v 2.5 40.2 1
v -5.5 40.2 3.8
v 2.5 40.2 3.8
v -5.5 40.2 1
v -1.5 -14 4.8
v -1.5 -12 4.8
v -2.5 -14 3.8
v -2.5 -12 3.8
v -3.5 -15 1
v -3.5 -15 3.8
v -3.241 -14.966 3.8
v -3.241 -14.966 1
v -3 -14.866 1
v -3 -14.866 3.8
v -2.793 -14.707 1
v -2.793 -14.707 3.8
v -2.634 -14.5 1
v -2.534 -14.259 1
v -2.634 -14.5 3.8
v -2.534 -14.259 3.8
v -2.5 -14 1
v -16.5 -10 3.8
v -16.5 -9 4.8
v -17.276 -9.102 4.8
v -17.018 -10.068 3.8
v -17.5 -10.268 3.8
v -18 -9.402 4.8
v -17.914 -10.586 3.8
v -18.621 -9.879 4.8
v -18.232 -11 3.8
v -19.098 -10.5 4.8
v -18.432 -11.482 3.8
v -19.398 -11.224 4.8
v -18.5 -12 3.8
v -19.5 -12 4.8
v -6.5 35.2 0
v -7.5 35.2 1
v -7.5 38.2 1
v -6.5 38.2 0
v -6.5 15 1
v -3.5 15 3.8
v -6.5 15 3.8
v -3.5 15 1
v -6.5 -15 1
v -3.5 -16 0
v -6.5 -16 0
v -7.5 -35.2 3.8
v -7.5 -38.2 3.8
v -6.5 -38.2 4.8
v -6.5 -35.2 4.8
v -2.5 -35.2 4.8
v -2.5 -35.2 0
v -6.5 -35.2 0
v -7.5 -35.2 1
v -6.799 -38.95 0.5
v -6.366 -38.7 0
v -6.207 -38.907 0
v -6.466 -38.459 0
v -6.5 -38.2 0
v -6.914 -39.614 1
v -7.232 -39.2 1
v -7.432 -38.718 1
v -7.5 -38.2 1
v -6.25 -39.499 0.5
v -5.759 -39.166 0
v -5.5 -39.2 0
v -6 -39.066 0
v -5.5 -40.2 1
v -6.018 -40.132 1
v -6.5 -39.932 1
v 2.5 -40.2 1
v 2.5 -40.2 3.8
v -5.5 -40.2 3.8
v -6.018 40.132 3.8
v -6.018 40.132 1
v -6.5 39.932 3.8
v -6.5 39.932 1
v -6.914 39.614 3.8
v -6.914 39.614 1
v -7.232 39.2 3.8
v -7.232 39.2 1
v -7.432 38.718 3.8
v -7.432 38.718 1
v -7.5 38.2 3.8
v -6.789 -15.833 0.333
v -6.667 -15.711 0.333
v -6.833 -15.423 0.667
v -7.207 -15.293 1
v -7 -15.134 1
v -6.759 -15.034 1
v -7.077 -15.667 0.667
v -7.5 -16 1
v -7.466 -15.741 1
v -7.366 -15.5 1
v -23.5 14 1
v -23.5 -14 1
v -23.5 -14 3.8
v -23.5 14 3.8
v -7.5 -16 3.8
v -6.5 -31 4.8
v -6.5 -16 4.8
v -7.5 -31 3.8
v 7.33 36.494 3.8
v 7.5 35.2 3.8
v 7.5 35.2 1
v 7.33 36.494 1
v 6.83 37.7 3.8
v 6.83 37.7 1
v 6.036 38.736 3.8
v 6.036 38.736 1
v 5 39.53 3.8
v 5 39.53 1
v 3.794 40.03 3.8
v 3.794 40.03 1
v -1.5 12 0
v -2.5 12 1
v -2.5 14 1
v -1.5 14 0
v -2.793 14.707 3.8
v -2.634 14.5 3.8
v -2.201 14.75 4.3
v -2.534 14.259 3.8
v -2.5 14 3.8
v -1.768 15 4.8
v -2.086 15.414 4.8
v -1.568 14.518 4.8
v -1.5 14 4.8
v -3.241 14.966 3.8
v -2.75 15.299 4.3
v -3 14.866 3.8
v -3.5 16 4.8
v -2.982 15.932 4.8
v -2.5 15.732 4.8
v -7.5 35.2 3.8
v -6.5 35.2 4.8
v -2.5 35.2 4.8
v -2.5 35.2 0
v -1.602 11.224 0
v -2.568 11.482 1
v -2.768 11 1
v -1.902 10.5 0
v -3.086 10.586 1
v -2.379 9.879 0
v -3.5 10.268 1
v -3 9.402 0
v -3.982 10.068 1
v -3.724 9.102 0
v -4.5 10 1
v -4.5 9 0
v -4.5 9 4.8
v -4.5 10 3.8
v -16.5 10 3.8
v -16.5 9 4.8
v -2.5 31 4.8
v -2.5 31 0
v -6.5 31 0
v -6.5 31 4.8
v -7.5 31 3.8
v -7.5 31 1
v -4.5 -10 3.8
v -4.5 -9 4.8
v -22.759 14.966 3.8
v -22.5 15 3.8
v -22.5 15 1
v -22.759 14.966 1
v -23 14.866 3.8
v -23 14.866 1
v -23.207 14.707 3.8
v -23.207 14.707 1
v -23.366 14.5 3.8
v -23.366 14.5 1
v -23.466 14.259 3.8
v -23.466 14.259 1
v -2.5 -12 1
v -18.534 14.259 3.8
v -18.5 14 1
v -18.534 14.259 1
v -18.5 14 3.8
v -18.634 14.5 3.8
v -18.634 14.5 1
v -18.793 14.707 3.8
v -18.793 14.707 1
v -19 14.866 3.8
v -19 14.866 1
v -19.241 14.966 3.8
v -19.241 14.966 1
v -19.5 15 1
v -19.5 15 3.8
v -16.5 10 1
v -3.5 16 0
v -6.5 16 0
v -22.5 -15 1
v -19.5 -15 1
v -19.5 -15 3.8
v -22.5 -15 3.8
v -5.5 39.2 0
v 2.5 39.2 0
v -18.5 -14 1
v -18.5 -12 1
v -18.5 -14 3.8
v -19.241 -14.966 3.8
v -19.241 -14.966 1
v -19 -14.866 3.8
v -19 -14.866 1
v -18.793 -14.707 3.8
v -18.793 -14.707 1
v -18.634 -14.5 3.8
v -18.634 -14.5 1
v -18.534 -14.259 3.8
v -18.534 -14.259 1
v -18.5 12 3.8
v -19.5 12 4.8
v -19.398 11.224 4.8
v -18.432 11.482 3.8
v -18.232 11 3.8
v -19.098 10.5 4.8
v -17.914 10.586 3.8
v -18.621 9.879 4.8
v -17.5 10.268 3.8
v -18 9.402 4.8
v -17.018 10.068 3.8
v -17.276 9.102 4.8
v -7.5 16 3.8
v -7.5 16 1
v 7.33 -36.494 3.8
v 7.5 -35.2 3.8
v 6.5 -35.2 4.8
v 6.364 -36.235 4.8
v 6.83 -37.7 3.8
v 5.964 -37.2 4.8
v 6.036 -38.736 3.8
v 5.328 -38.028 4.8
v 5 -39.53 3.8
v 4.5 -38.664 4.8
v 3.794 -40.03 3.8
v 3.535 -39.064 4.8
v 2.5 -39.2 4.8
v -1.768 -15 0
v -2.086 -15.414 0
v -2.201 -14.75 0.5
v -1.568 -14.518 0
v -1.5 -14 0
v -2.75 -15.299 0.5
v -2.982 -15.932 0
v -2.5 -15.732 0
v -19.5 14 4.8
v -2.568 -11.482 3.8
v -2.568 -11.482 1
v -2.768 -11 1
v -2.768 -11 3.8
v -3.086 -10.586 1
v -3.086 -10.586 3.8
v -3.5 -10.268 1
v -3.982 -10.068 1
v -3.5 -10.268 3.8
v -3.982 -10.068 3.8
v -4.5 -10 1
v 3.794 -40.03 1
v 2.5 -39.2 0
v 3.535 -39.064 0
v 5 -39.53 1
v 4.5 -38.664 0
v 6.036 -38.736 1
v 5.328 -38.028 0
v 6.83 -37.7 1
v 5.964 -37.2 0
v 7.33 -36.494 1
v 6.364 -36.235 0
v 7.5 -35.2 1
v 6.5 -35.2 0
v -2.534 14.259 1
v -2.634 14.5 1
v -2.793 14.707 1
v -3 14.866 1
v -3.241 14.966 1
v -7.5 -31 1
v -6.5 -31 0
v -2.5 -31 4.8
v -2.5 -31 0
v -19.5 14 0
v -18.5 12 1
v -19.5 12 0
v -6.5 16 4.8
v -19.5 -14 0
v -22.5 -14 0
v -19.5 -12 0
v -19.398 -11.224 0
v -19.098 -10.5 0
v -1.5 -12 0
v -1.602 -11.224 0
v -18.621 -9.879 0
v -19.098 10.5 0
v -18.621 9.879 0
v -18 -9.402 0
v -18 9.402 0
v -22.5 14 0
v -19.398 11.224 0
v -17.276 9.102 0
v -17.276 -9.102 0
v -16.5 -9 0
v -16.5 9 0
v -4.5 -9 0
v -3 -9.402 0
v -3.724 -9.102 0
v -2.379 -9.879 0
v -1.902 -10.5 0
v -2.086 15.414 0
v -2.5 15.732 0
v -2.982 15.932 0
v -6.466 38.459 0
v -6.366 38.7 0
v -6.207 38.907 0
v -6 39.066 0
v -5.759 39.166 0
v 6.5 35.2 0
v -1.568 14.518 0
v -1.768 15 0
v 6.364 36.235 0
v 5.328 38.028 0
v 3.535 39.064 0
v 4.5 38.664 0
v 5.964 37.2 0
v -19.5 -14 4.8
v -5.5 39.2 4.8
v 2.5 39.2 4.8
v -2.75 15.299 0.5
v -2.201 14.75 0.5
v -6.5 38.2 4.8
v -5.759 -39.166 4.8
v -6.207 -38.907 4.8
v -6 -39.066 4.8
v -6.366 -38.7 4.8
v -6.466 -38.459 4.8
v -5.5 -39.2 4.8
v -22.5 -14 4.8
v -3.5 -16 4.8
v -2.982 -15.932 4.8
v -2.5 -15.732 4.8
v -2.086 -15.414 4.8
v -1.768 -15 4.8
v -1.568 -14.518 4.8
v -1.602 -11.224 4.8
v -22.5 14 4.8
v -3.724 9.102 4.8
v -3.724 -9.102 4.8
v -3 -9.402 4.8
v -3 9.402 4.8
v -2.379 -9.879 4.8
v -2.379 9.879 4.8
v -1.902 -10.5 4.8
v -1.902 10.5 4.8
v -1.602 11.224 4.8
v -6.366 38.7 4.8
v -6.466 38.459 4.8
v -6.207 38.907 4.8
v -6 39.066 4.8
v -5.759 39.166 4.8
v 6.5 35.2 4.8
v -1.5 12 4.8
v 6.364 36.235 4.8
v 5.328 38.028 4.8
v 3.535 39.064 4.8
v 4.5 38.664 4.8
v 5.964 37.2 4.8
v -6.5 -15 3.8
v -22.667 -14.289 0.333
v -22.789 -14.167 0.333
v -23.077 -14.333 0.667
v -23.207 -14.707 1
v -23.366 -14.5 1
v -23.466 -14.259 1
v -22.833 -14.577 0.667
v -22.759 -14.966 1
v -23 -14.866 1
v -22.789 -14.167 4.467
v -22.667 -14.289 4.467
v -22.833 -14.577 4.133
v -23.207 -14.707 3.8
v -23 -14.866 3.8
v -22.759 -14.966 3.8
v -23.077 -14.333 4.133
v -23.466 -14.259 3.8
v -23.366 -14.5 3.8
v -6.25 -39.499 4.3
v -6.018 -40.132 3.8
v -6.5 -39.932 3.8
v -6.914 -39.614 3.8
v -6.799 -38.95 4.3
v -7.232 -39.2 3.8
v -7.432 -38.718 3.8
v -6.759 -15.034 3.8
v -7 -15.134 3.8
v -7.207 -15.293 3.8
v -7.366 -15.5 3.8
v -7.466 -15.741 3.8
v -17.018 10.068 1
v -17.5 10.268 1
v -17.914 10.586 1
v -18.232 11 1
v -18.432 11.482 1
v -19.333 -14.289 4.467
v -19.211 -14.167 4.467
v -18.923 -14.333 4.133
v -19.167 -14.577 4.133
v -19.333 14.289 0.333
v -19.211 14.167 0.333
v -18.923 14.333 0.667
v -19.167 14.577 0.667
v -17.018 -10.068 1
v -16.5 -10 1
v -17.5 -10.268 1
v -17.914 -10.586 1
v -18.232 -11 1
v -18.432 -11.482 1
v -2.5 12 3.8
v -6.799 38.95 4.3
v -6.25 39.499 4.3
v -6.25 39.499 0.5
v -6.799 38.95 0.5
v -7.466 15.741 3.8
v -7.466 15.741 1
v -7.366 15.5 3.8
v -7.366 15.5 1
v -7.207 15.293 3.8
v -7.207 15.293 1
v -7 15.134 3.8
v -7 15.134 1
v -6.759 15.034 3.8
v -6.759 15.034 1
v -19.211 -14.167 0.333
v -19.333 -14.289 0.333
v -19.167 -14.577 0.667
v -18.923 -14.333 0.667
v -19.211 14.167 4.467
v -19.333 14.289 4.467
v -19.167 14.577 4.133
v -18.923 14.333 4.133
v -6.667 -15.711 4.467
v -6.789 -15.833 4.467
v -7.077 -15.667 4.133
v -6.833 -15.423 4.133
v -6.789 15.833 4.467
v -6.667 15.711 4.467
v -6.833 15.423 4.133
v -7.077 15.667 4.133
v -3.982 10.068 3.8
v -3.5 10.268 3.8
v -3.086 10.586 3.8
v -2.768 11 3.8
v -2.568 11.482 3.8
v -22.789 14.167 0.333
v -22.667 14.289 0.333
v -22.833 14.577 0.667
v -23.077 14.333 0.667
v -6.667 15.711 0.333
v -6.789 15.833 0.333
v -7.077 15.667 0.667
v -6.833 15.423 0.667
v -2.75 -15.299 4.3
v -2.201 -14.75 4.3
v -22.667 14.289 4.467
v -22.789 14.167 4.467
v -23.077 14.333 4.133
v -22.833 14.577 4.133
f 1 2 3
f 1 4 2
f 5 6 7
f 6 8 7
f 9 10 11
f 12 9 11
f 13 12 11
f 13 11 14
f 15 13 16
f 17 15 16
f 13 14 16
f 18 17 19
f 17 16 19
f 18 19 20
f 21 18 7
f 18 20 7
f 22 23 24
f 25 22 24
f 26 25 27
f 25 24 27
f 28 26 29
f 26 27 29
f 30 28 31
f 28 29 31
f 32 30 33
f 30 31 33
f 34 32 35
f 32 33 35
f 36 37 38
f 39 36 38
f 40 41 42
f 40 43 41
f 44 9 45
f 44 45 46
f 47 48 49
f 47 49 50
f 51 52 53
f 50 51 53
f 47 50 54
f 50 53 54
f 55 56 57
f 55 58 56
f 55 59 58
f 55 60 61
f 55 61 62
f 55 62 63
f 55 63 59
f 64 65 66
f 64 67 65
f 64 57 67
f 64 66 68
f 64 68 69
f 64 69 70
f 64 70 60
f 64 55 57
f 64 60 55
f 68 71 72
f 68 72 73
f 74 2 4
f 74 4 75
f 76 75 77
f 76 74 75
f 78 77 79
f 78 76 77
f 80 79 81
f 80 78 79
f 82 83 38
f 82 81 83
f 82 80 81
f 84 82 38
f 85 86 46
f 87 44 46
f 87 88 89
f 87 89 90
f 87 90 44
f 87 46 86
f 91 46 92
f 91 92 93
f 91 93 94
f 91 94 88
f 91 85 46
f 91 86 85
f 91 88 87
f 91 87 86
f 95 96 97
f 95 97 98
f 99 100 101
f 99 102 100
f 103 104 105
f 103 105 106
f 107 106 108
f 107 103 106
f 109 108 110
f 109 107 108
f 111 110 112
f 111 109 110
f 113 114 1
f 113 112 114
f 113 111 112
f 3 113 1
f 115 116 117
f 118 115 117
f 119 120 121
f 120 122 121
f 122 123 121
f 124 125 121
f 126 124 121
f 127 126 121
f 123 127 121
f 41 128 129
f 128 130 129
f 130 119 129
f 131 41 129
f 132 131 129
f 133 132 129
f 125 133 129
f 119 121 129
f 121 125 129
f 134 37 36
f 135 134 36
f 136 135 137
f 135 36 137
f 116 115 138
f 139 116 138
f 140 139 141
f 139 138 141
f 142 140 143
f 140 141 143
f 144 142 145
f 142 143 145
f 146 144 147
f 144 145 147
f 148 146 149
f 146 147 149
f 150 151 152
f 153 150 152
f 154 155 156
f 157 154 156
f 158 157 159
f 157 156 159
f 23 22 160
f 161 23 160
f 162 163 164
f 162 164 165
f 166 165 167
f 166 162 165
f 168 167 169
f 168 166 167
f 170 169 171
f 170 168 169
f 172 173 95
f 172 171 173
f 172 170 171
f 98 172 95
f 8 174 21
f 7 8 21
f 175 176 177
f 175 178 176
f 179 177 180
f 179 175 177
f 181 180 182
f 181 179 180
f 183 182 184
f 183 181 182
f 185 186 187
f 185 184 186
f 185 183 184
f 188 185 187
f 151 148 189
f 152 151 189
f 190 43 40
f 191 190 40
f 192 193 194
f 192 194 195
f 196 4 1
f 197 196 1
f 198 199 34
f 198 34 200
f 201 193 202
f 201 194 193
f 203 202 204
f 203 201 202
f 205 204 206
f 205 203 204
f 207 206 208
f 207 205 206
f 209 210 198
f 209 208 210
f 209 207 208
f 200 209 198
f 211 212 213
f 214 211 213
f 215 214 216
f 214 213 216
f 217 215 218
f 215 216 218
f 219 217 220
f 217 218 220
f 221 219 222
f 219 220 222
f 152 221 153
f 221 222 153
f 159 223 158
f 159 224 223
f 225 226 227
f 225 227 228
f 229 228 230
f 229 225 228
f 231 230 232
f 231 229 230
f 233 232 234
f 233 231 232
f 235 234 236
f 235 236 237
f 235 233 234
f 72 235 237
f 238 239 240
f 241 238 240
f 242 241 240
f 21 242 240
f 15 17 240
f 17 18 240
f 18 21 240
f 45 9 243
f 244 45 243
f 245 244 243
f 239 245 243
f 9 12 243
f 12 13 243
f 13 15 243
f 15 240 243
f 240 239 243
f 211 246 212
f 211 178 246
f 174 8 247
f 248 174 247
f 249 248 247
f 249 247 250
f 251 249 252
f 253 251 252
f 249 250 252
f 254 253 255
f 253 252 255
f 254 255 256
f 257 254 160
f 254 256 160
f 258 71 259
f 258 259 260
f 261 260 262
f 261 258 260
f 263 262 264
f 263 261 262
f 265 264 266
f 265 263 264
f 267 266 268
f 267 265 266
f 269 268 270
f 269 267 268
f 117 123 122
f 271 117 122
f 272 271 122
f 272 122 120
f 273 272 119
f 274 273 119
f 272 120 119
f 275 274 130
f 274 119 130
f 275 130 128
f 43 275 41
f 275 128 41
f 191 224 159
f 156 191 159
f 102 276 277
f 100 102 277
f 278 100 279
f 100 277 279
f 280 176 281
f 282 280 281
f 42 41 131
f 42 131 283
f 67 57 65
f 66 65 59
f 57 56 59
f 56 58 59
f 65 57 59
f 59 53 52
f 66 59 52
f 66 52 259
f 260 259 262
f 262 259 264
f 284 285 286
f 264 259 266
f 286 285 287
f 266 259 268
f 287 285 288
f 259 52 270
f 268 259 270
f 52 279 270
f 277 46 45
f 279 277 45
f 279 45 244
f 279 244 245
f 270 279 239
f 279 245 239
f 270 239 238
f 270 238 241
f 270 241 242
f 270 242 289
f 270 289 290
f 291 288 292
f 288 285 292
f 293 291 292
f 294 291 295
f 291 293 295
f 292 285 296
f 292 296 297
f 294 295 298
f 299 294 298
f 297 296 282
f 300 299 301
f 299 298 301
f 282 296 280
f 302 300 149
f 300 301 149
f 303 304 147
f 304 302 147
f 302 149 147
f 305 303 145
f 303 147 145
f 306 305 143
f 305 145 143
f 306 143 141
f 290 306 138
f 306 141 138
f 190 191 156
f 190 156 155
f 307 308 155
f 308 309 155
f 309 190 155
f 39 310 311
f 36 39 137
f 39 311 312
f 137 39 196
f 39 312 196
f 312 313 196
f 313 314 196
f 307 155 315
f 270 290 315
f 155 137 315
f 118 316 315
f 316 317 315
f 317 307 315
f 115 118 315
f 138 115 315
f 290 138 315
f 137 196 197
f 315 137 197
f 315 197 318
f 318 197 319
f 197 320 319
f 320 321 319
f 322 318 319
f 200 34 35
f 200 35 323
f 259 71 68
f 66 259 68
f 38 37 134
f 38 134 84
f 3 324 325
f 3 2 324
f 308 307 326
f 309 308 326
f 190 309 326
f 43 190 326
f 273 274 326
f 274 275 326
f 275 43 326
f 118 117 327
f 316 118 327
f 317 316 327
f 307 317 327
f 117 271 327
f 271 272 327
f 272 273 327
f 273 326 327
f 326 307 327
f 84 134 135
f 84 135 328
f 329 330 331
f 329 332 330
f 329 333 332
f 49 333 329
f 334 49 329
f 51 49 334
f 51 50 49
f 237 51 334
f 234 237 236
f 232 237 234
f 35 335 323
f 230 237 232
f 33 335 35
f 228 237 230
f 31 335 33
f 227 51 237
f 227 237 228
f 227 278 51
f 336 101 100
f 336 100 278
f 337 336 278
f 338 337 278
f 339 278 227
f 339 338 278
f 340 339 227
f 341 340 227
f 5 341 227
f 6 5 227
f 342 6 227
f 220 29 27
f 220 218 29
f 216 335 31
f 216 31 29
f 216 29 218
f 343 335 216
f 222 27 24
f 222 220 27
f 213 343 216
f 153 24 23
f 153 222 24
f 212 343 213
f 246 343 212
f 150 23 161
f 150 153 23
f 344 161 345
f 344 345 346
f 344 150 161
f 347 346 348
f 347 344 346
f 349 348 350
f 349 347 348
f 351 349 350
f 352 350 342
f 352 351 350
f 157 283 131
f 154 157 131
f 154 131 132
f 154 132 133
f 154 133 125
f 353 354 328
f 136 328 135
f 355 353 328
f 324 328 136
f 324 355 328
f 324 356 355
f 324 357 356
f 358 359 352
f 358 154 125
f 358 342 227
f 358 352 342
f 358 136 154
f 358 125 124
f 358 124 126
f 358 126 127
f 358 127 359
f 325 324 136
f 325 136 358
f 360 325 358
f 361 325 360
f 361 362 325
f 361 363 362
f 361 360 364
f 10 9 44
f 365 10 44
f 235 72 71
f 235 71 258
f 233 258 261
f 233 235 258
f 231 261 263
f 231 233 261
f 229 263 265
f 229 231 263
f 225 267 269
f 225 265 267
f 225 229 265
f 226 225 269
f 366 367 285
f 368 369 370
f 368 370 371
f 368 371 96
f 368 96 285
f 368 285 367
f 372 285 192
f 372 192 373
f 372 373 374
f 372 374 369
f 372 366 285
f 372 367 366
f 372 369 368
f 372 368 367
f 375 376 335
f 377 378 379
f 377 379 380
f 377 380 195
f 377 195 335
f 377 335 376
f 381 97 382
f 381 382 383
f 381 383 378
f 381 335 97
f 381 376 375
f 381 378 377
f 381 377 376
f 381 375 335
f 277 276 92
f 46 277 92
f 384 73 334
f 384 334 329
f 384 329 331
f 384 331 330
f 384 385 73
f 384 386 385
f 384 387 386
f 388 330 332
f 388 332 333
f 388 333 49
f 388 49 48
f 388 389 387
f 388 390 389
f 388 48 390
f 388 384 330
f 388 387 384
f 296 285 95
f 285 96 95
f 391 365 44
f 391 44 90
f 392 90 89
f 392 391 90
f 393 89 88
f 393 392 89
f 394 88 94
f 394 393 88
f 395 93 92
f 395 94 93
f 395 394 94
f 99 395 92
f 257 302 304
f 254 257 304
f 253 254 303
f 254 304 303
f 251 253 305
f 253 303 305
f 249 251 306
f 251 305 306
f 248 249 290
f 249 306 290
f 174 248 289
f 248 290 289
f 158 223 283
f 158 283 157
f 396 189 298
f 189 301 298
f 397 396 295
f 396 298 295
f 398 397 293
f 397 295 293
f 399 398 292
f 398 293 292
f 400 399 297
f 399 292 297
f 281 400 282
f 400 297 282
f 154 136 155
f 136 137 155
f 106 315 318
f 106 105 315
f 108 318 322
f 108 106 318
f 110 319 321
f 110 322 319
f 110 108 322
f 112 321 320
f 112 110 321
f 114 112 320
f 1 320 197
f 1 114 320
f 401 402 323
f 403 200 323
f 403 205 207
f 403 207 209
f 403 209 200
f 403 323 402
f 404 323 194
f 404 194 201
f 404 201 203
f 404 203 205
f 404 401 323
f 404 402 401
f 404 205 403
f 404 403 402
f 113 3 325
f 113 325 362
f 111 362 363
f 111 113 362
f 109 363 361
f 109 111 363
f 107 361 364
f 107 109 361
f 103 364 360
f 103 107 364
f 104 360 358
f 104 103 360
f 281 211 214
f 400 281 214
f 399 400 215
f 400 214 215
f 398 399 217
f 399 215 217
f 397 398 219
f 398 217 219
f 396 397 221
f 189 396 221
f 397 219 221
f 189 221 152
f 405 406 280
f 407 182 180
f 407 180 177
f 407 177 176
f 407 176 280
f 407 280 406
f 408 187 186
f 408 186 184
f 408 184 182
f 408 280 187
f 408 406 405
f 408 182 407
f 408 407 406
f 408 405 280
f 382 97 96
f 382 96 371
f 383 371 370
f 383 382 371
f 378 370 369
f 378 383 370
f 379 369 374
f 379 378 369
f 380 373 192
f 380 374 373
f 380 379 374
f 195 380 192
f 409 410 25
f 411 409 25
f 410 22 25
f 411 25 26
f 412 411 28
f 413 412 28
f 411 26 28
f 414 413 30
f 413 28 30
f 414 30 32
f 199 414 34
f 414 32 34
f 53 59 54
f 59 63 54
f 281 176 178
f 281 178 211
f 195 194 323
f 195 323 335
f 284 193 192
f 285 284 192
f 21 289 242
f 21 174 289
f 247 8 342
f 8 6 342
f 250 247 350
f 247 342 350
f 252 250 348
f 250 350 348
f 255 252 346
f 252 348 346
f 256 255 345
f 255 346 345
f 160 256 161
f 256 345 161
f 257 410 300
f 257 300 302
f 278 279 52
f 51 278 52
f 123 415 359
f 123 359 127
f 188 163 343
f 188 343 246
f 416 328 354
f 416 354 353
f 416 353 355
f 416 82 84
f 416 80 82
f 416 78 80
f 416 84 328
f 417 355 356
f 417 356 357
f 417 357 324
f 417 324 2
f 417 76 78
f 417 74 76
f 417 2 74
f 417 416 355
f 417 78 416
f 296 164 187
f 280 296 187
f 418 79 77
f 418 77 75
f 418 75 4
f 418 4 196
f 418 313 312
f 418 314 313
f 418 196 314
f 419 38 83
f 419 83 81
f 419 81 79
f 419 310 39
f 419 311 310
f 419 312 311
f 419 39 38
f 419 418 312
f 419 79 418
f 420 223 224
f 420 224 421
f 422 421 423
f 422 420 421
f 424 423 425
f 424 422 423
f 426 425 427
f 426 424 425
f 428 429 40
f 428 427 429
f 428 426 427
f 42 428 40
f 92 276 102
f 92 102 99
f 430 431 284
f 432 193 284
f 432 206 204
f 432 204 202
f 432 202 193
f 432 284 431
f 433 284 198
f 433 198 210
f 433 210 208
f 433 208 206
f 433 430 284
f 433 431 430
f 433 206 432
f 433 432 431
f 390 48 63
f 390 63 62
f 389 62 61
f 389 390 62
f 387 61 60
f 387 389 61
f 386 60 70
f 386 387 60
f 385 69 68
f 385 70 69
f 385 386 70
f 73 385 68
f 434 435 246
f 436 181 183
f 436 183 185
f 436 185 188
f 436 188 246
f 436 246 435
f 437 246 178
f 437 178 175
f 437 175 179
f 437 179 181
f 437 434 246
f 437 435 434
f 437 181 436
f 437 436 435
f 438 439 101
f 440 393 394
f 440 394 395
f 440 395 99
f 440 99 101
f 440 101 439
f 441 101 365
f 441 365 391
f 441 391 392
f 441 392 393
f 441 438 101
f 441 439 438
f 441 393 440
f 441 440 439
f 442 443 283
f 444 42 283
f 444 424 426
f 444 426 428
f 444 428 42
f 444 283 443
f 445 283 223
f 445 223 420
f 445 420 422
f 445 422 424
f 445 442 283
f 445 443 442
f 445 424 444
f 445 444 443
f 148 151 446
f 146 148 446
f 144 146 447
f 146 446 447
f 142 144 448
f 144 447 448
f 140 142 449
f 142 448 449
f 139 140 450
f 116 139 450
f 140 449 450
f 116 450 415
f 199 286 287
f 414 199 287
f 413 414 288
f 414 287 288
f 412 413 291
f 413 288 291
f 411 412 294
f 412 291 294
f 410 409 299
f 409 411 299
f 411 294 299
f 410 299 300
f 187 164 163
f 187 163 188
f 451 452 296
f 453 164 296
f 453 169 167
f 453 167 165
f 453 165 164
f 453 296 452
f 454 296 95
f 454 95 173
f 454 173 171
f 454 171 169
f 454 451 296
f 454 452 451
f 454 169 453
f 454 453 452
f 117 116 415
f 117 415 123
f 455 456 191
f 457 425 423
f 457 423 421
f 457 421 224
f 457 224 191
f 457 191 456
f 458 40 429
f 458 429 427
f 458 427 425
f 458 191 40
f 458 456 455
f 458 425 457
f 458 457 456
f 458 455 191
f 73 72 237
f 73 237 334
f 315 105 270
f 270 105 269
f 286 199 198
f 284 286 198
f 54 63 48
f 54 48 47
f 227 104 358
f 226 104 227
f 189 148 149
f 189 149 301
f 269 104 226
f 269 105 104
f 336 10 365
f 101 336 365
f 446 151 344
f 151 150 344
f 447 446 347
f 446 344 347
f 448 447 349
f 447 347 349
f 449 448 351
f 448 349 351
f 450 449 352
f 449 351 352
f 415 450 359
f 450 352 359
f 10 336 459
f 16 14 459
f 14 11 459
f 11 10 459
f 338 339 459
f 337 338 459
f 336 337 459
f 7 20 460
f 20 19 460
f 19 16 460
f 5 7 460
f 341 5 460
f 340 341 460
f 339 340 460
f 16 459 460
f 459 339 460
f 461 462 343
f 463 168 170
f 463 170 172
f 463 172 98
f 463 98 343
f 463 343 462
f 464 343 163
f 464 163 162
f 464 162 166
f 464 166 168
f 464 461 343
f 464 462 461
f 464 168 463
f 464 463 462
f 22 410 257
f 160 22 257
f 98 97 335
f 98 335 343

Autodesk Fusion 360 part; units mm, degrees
sketch "Sketch1" plane through (0, 0, 0) normal (0, 0, 1) x (1, 0, 0)
  line L0 (7.5, -40.2) -> (-7.5, -40.2)
  line L1 (-7.5, -40.2) -> (-7.5, 40.2)
  line L2 (-7.5, 40.2) -> (7.5, 40.2)
  line L3 (7.5, 40.2) -> (7.5, -40.2)
  line L4 (7.5, -40.2) -> (-7.5, 40.2) construction
  line L5 (-7.5, -40.2) -> (7.5, 40.2) construction
  line L6 (-7.5, 35.2) -> (-2.5, 35.2)
  line L7 (-2.5, 35.2) -> (-2.5, 31)
  line L8 (-2.5, 31) -> (-7.5, 31)
  line L9 (-7.5, 31) -> (-7.5, 35.2)
  line L10 (-7.5, -31) -> (-2.5, -31)
  line L11 (-2.5, -31) -> (-2.5, -35.2)
  line L12 (-2.5, -35.2) -> (-7.5, -35.2)
  line L13 (-7.5, -35.2) -> (-7.5, -31)
  line L14 (-2.5, 10) -> (-18.5, 10)
  line L15 (-18.5, 10) -> (-18.5, -10)
  line L16 (-18.5, -10) -> (-2.5, -10)
  line L17 (-2.5, -10) -> (-2.5, 10)
  line L18 (-23.5, 15) -> (-18.5, 15)
  line L19 (-18.5, 15) -> (-18.5, -15)
  line L20 (-18.5, -15) -> (-23.5, -15)
  line L21 (-23.5, -15) -> (-23.5, 15)
  line L22 (-2.5, -10) -> (-2.5, -15)
  line L23 (-2.5, -15) -> (-7.5, -15)
  line L24 (-2.5, 10) -> (-2.5, 15)
  line L25 (-2.5, 15) -> (-7.5, 15)
  dimension "d1" = 80.4
  dimension "d2" = 15
  dimension "d3" = 5
  dimension "d4" = 4.2
  dimension "d5" = 5
  dimension "d6" = 4.2
  dimension "d7" = 5
  dimension "d8" = 5
  dimension "d9" = 16
  dimension "d10" = 5
  dimension "d11" = 5
  dimension "d12" = 5
  dimension "d13" = 30
  dimension "d14" = 5
  dimension "d15" = 20
  dimension "d16" = 10
  dimension "d26" = 5
  dimension "d27" = 5
extrude "Extrude1" add sketch "Sketch1" along normal blind 4.8 contours L0 L1 L2 L3 L6 L7 L8 L10 L11 L12 L17 L22 L23 L24 L25 | L1 L14 L15 L16 L19 | L1 L14 L16 L17 | L15 L18 L19 L20 L21
fillet "Fillet1" radius 5 2 edges at (7.5, 40.2, 2.4) (7.5, -40.2, 2.4)
fillet "Fillet1" radius 2 6 edges at (-18.5, 10, 2.4) (-18.5, -10, 2.4) (-7.5, 40.2, 2.4) (-7.5, -40.2, 2.4) (-2.5, -10, 2.4) (-2.5, 10, 2.4)
fillet "Fillet1" radius 1 8 edges at (-18.5, 15, 2.4) (-23.5, 15, 2.4) (-18.5, -15, 2.4) (-23.5, -15, 2.4) (-2.5, 15, 2.4) (-7.5, 15, 2.4) (-2.5, -15, 2.4) (-7.5, -15, 2.4)
chamfer "Chamfer1" distance 1 angle 45 28 edges at (-10.5, 10, 4.8) (-10.5, -10, 4.8) (-10.5, -10, 0) (-10.5, 10, 0) (7.5, 0, 4.8) (7.5, 0, 0) (-18.5, -12.5, 4.8) (-18.5, -12.5, 0) (-21, -15, 4.8) (-21, -15, 0) (-23.5, 0, 4.8) (-7.5, -23, 4.8) (-7.5, -23, 0) (-7.5, -37.7, 0) (0, -40.2, 0) (0, -40.2, 4.8) (0, 40.2, 4.8) (-7.5, 37.7, 4.8) (-7.5, 37.7, 0) (-7.5, 23, 4.8) (-7.5, 23, 0) (-7.5, -37.7, 4.8) (-23.5, 0, 0) (-21, 15, 0) (0, 40.2, 0) (-18.5, 12.5, 0) (-21, 15, 4.8) (-18.5, 12.5, 4.8)
equation "d12 = d11"
equation "d16 = d15 / 2"
equation "d26 = d14"
equation "d27 = d26"
